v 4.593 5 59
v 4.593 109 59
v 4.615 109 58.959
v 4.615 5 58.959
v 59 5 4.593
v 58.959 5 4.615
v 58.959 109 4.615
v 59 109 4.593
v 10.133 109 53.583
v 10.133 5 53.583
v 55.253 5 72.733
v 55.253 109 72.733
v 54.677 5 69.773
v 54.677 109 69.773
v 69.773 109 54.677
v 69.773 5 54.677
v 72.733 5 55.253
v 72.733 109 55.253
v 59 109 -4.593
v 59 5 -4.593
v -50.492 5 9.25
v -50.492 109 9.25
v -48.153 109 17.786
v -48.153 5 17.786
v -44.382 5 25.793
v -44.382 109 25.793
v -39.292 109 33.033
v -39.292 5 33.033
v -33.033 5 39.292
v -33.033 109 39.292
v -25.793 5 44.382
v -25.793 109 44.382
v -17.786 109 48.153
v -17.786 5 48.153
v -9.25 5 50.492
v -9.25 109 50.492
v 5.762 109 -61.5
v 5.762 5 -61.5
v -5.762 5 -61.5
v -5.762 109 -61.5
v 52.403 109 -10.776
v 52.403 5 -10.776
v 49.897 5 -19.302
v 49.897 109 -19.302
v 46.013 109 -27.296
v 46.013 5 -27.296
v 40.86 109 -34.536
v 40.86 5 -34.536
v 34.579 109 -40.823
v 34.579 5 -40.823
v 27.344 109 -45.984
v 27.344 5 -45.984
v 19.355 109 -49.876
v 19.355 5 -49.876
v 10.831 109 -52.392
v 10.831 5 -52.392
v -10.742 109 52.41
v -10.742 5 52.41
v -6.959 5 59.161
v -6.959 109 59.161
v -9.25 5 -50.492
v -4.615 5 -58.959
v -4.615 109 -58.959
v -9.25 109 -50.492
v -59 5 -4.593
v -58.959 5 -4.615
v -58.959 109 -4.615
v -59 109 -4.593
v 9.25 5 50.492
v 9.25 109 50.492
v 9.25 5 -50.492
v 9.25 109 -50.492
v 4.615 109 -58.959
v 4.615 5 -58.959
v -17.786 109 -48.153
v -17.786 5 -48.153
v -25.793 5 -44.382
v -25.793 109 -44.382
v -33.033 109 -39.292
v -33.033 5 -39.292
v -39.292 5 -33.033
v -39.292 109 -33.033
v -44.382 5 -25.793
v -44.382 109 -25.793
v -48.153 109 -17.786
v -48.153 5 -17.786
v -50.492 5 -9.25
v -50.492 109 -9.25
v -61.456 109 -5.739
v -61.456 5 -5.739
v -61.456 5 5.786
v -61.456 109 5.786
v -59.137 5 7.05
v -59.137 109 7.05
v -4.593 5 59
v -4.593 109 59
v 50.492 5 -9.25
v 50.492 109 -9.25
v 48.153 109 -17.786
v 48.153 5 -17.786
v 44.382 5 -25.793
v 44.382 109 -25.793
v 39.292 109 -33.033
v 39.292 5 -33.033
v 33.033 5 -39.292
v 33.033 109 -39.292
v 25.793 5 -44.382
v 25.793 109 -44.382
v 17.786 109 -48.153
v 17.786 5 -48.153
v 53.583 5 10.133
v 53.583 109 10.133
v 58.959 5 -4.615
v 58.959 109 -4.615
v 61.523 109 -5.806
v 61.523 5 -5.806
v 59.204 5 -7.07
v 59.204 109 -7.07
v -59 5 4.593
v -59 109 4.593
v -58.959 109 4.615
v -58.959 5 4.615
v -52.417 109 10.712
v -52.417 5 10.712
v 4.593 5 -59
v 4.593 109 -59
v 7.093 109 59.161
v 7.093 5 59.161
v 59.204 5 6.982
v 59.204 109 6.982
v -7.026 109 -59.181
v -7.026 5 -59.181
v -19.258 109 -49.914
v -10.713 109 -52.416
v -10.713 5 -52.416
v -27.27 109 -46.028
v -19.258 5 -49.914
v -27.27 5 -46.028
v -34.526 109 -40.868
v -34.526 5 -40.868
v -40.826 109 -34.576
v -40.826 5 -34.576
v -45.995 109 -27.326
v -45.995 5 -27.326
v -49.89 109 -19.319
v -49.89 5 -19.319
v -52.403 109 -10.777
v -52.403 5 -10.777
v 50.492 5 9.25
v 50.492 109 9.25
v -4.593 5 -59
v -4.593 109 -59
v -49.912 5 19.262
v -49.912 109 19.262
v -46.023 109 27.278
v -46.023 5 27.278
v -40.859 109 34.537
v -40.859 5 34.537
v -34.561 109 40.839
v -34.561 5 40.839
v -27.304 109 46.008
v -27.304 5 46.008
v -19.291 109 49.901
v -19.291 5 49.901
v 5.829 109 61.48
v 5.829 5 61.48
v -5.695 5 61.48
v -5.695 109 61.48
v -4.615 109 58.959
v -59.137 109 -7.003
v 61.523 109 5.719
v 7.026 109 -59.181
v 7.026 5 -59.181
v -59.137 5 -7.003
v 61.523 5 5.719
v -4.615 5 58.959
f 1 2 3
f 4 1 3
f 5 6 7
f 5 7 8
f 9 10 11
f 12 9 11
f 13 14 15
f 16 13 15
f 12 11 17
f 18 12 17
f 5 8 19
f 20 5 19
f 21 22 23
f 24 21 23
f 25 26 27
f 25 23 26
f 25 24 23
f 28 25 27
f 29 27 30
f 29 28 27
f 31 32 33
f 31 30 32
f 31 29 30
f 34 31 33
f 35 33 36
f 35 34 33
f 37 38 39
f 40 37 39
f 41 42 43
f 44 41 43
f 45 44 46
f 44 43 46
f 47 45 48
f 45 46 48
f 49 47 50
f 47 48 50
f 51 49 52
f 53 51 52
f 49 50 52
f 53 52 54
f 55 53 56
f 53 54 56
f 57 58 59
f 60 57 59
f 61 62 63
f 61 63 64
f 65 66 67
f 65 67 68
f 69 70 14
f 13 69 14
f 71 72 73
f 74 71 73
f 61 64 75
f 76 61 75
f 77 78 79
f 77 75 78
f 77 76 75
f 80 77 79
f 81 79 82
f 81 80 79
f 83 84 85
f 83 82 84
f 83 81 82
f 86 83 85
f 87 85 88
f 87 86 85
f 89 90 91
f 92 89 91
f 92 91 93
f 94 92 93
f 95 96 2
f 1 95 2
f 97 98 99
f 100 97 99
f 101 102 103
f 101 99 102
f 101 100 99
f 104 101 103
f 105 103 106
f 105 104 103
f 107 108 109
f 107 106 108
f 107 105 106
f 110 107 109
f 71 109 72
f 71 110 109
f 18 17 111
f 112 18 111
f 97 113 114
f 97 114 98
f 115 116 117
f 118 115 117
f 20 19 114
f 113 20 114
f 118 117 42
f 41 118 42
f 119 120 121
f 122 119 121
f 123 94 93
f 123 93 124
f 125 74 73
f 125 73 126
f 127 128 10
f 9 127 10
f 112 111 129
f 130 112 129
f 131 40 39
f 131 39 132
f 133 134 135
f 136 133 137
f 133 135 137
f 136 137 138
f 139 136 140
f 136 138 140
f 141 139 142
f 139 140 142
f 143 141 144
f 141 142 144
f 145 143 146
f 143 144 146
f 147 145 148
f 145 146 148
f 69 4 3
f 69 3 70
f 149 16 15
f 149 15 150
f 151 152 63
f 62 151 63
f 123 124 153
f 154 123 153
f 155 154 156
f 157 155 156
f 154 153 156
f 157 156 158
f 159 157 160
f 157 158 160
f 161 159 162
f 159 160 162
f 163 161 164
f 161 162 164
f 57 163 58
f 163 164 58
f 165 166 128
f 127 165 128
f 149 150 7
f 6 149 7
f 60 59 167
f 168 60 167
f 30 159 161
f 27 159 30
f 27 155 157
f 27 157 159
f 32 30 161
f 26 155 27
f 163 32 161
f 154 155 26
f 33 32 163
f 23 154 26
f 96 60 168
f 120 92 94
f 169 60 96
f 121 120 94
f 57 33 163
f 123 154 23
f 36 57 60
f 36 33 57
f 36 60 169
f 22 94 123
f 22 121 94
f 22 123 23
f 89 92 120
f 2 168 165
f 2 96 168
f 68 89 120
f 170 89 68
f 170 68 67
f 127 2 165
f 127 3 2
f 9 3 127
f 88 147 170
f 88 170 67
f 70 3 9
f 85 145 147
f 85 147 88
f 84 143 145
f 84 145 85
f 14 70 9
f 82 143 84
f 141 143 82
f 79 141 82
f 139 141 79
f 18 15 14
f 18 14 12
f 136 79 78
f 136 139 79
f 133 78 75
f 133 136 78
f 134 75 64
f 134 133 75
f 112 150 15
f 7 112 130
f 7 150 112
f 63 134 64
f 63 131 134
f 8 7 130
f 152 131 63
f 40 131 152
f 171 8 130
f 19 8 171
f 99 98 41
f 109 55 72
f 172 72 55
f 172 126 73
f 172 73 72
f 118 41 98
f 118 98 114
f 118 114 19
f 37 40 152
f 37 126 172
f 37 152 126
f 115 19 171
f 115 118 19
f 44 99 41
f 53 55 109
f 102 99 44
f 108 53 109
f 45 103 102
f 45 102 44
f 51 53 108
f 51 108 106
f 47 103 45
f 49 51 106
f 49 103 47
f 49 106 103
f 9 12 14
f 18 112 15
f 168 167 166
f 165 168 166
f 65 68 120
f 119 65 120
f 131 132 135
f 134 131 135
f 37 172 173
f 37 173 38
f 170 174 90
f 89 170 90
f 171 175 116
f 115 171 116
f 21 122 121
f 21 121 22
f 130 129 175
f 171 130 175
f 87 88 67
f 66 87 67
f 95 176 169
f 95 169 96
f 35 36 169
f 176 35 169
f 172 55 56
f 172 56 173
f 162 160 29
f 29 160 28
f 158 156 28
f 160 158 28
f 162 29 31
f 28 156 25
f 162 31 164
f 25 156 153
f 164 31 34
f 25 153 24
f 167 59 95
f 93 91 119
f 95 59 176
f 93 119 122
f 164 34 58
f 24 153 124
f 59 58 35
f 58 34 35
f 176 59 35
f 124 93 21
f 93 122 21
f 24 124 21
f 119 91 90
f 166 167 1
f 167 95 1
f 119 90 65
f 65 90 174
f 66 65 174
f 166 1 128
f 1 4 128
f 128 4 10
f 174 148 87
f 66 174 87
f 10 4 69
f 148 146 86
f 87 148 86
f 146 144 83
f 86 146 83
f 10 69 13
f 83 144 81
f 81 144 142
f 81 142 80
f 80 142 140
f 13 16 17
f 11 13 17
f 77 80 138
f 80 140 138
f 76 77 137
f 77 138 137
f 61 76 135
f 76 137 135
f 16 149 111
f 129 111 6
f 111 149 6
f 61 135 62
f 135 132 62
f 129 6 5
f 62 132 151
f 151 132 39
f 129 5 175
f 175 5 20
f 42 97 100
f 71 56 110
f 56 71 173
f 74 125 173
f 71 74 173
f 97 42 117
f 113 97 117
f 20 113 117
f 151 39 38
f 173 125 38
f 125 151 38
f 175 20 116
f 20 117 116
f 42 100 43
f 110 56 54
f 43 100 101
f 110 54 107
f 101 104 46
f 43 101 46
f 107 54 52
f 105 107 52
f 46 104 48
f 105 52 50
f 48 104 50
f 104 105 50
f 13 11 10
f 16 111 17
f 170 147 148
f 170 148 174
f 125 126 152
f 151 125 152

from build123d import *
from build123d.topology import SkipClean

# Parameters (mm, degrees)
SALIENTE_EXTRUIR1_DEPTH = 5
CROQUIS2_R              = 2.1
CORTAR_EXTRUIR1_DEPTH   = 83.176639016
CORTAR_EXTRUIR2_DEPTH   = 83.176639016
CROQUIS5_R              = 2.05
CORTAR_EXTRUIR4_DEPTH   = 83.176639016
SALIENTE_EXTRUIR2_DEPTH = 5
CORTAR_EXTRUIR10_DEPTH  = 98.128780493
SALIENTE_EXTRUIR4_DEPTH = 4
SALIENTE_EXTRUIR5_DEPTH = 4
CROQUIS17_R             = 2.4
CORTAR_EXTRUIR11_DEPTH  = 98.128780493
SALIENTE_EXTRUIR6_DEPTH = 104
CORTAR_EXTRUIR12_DEPTH  = 200


with BuildPart() as part:
    # Croquis1 → Saliente-Extruir1 (new body)
    with BuildSketch(Plane(origin=(0, 0, 0), x_dir=(1, 0, 0), z_dir=(0, 1, 0))):
        with BuildLine():
            Line((4, 58), (8.807070745, 49.218243619))
            ThreePointArc((8.807070745, 49.218243619), (35.355339059, 35.355339059), (49.218243619, 8.807070745))
            Line((49.218243619, 8.807070745), (58, 4))
            Line((58, 4), (58, -4))
            Line((58, -4), (49.218243619, -8.807070745))
            ThreePointArc((49.218243619, -8.807070745), (35.355339059, -35.355339059), (8.807070745, -49.218243619))
            Line((8.807070745, -49.218243619), (4, -58))
            Line((4, -58), (-4, -58))
            Line((-4, -58), (-8.807070745, -49.218243619))
            ThreePointArc((-8.807070745, -49.218243619), (-35.355339059, -35.355339059), (-49.218243619, -8.807070745))
            Line((-49.218243619, -8.807070745), (-58, -4))
            Line((-58, -4), (-58, 4))
            Line((-58, 4), (-49.218243619, 8.807070745))
            ThreePointArc((-49.218243619, 8.807070745), (-35.355339059, 35.355339059), (-8.807070745, 49.218243619))
            Line((-8.807070745, 49.218243619), (-4, 58))
            Line((-4, 58), (4, 58))
        make_face()
    extrude(amount=SALIENTE_EXTRUIR1_DEPTH)

    # Croquis2 → Cortar-Extruir1 (cut, through all)
    with BuildSketch(Plane(origin=(0, 5, 0), x_dir=(1, 0, 0), z_dir=(0, 1, 0))):
        with Locations(Location((0, 52.7, 0), (0, 0, 270))):
            Circle(CROQUIS2_R)
        with Locations(Location((52.7, 0, 0), (0, 0, 270))):
            Circle(CROQUIS2_R)
        with Locations(Location((0, -52.7, 0), (0, 0, 270))):
            Circle(CROQUIS2_R)
        with Locations(Location((-52.7, 0, 0), (0, 0, 270))):
            Circle(CROQUIS2_R)
    extrude(amount=-CORTAR_EXTRUIR1_DEPTH, mode=Mode.SUBTRACT)

    # Croquis3 → Cortar-Extruir2 (cut, through all)
    with BuildSketch(Plane(origin=(0, 5, 0), x_dir=(1, 0, 0), z_dir=(0, 1, 0))):
        Polygon((20.506096654, -34.648232278), (34.648232278, -20.506096654), (47.376154339, -33.234018716), (67.218949341, -53.076813717), (53.076813717, -67.218949341), (33.234018716, -47.376154339), align=None)
    extrude(amount=-CORTAR_EXTRUIR2_DEPTH, mode=Mode.SUBTRACT)

    # Croquis5 → Cortar-Extruir4 (cut, through all)
    with BuildSketch(Plane(origin=(0, 5, 0), x_dir=(1, 0, 0), z_dir=(0, 1, 0))):
        with Locations(Location((-7.78, 7.78, 0), (0, 0, 270))):
            Circle(CROQUIS5_R)
        with Locations(Location((7.78, 7.78, 0), (0, 0, 270))):
            Circle(CROQUIS5_R)
        with Locations(Location((7.78, -7.78, 0), (0, 0, 270))):
            Circle(CROQUIS5_R)
        with Locations(Location((-7.78, -7.78, 0), (0, 0, 270))):
            Circle(CROQUIS5_R)
        with BuildLine():
            Line((21.554064831, -30.039346205), (23.334523779, -31.819805153))
            Line((23.334523779, -31.819805153), (24.748737342, -30.405591591))
            Line((24.748737342, -30.405591591), (22.968278393, -28.625132642))
            ThreePointArc((22.968278393, -28.625132642), (19.622213178, -26.69328099), (21.554064831, -30.039346205))
        make_face()
        with BuildLine():
            Line((28.625132642, -22.968278393), (30.986174209, -25.329319959))
            Line((30.986174209, -25.329319959), (32.400387771, -23.915106397))
            Line((32.400387771, -23.915106397), (30.039346205, -21.554064831))
            ThreePointArc((30.039346205, -21.554064831), (26.69328099, -19.622213178), (28.625132642, -22.968278393))
        make_face()
    extrude(amount=-CORTAR_EXTRUIR4_DEPTH, mode=Mode.SUBTRACT)

    # Croquis7 → Saliente-Extruir2 (add, through all)
    with BuildSketch(Plane(origin=(0, 5, 0), x_dir=(1, 0, 0), z_dir=(0, 1, 0))):
        Polygon((68.589357775, -54.447222151), (54.447222151, -68.589357775), (8.807070745, -49.218243619), (18.571685103, -46.422973972), (27.56994834, -41.712083963), (48.790367902, -62.932503526), (62.932503526, -48.790367902), (41.712083963, -27.56994834), (46.422973972, -18.571685103), (49.218243619, -8.807070745), align=None)
    extrude(amount=-SALIENTE_EXTRUIR2_DEPTH)

    # Croquis8 → Cortar-Extruir10 (cut, through all)
    with BuildSketch(Plane(origin=(0, 5, 0), x_dir=(1, 0, 0), z_dir=(0, 1, 0))):
        with BuildLine():
            Line((54.283137452, -59.939991701), (51.490214314, -57.147068564))
            Line((51.490214314, -57.147068564), (50.076000752, -58.561282126))
            Line((50.076000752, -58.561282126), (52.868923889, -61.354205264))
            ThreePointArc((52.868923889, -61.354205264), (56.214989104, -63.286056916), (54.283137452, -59.939991701))
        make_face()
        with BuildLine():
            Line((57.371843354, -51.714989104), (58.786056916, -50.300775542))
            Line((58.786056916, -50.300775542), (61.354205264, -52.868923889))
            ThreePointArc((61.354205264, -52.868923889), (63.286056916, -56.214989104), (59.939991701, -54.283137452))
            Line((59.939991701, -54.283137452), (57.371843354, -51.714989104))
        make_face()
    extrude(amount=-CORTAR_EXTRUIR10_DEPTH, mode=Mode.SUBTRACT)

    # Croquis15 → Saliente-Extruir4 (add)
    with BuildSketch(Plane.XZ):
        with BuildLine():
            Line((-1.111111111, -20.469866441), (-1.111111111, -22.472548411))
            ThreePointArc((-1.111111111, -22.472548411), (0, 22.5), (1.111111111, -22.472548411))
            Line((1.111111111, -22.472548411), (1.111111111, -20.469866441))
            ThreePointArc((1.111111111, -20.469866441), (0, 20.5), (-1.111111111, -20.469866441))
        make_face()
    extrude(amount=SALIENTE_EXTRUIR4_DEPTH)

    # Croquis16 → Saliente-Extruir5 (add)
    with SkipClean():  # the faces are left unmerged after this step: merging them gives an invalid solid
        with BuildSketch(Plane.XZ):
            with BuildLine():
                Line((-1.111111111, -20.469866441), (-1.111111111, -22.472548411))
                ThreePointArc((-1.111111111, -22.472548411), (0, -22.5), (1.111111111, -22.472548411))
                Line((1.111111111, -22.472548411), (1.111111111, -20.469866441))
                ThreePointArc((1.111111111, -20.469866441), (0, -20.5), (-1.111111111, -20.469866441))
            make_face()
        extrude(amount=SALIENTE_EXTRUIR5_DEPTH)

    # Croquis17 → Cortar-Extruir11 (cut, through all)
    with SkipClean():  # the faces are left unmerged after this step: merging them gives an invalid solid
        with BuildSketch(Plane.XZ):
            with Locations(Location((42.43, 0, 0), (0, 0, 270))):
                Circle(CROQUIS17_R)
            with Locations(Location((0, -42.43, 0), (0, 0, 270))):
                Circle(CROQUIS17_R)
            with Locations(Location((-42.43, 0, 0), (0, 0, 270))):
                Circle(CROQUIS17_R)
            with Locations(Location((0, 42.43, 0), (0, 0, 270))):
                Circle(CROQUIS17_R)
        extrude(amount=-CORTAR_EXTRUIR11_DEPTH, mode=Mode.SUBTRACT)

    # Croquis18 → Saliente-Extruir6 (add)
    with SkipClean():  # the faces are left unmerged after this step: merging them gives an invalid solid
        with BuildSketch(Plane(origin=(0, 5, 0), x_dir=(1, 0, 0), z_dir=(0, 1, 0))):
            with BuildLine():
                Line((-7.026199157, 59.180786921), (-10.712769702, 52.416472271))
                ThreePointArc((-10.712769702, 52.416472271), (-37.80704006, 37.853371341), (-52.403312858, 10.776956969))
                Line((-52.403312858, 10.776956969), (-59.137075713, 7.002717611))
                Line((-59.137075713, 7.002717611), (-61.456288791, 5.738739948))
                Line((-61.456288791, 5.738739948), (-61.456288791, -5.78570304))
                Line((-61.456288791, -5.78570304), (-59.137075713, -7.049680703))
                Line((-59.137075713, -7.049680703), (-52.416550741, -10.71238575))
                ThreePointArc((-52.416550741, -10.71238575), (-37.841055246, -37.819367233), (-10.74243433, -52.41040073))
                Line((-10.74243433, -52.41040073), (-6.959006403, -59.160557259))
                Line((-6.959006403, -59.160557259), (-5.695028739, -61.479770337))
                Line((-5.695028739, -61.479770337), (5.829414249, -61.479770337))
                Line((5.829414249, -61.479770337), (7.093391912, -59.160557259))
                Line((7.093391912, -59.160557259), (10.133049539, -53.583232651))
                Line((10.133049539, -53.583232651), (55.252838681, -72.733488714))
                Line((55.252838681, -72.733488714), (72.733488714, -55.252838681))
                Line((72.733488714, -55.252838681), (53.583232651, -10.133049539))
                Line((53.583232651, -10.133049539), (59.204268467, -6.982487949))
                Line((59.204268467, -6.982487949), (61.523481546, -5.718510285))
                Line((61.523481546, -5.718510285), (61.523481546, 5.805932703))
                Line((61.523481546, 5.805932703), (59.204268467, 7.069910366))
                Line((59.204268467, 7.069910366), (52.403430197, 10.776386386))
                ThreePointArc((52.403430197, 10.776386386), (37.849997802, 37.810417433), (10.831208274, 52.392126578))
                Line((10.831208274, 52.392126578), (7.026199157, 59.180786921))
                Line((7.026199157, 59.180786921), (5.762221494, 61.5))
                Line((5.762221494, 61.5), (-5.762221494, 61.5))
                Line((-5.762221494, 61.5), (-7.026199157, 59.180786921))
            make_face()
        extrude(amount=SALIENTE_EXTRUIR6_DEPTH)

    # Croquis23 → Cortar-Extruir12 (cut)
    with BuildSketch(Plane.XZ.offset(4)):
        with BuildLine():
            Line((59, -4.59262422), (58.95889986, -4.615122143))
            Line((58.95889986, -4.615122143), (50.492416575, -9.249614646))
            ThreePointArc((50.492416575, -9.249614646), (36.297654901, -36.297654901), (9.249614646, -50.492416575))
            Line((9.249614646, -50.492416575), (4.615122143, -58.95889986))
            Line((4.615122143, -58.95889986), (4.592624221, -59))
            Line((4.592624221, -59), (-4.59262422, -59))
            Line((-4.59262422, -59), (-4.615122143, -58.95889986))
            Line((-4.615122143, -58.95889986), (-9.249614646, -50.492416575))
            ThreePointArc((-9.249614646, -50.492416575), (-36.297654901, -36.297654901), (-50.492416575, -9.249614646))
            Line((-50.492416575, -9.249614646), (-58.95889986, -4.615122143))
            Line((-58.95889986, -4.615122143), (-59, -4.592624221))
            Line((-59, -4.592624221), (-59, 4.59262422))
            Line((-59, 4.59262422), (-58.95889986, 4.615122143))
            Line((-58.95889986, 4.615122143), (-50.492416575, 9.249614646))
            ThreePointArc((-50.492416575, 9.249614646), (-36.297654901, 36.297654901), (-9.249614646, 50.492416575))
            Line((-9.249614646, 50.492416575), (-4.615122143, 58.95889986))
            Line((-4.615122143, 58.95889986), (-4.592624221, 59))
            Line((-4.592624221, 59), (4.59262422, 59))
            Line((4.59262422, 59), (4.615122143, 58.95889986))
            Line((4.615122143, 58.95889986), (9.249614646, 50.492416575))
            Line((9.249614646, 50.492416575), (54.677398303, 69.773395186))
            Line((54.677398303, 69.773395186), (69.773395186, 54.677398303))
            Line((69.773395186, 54.677398303), (50.492416575, 9.249614646))
            Line((50.492416575, 9.249614646), (58.95889986, 4.615122143))
            Line((58.95889986, 4.615122143), (59, 4.592624221))
            Line((59, 4.592624221), (59, -4.59262422))
        make_face()
    extrude(amount=-CORTAR_EXTRUIR12_DEPTH, mode=Mode.SUBTRACT)


solid = part.part
